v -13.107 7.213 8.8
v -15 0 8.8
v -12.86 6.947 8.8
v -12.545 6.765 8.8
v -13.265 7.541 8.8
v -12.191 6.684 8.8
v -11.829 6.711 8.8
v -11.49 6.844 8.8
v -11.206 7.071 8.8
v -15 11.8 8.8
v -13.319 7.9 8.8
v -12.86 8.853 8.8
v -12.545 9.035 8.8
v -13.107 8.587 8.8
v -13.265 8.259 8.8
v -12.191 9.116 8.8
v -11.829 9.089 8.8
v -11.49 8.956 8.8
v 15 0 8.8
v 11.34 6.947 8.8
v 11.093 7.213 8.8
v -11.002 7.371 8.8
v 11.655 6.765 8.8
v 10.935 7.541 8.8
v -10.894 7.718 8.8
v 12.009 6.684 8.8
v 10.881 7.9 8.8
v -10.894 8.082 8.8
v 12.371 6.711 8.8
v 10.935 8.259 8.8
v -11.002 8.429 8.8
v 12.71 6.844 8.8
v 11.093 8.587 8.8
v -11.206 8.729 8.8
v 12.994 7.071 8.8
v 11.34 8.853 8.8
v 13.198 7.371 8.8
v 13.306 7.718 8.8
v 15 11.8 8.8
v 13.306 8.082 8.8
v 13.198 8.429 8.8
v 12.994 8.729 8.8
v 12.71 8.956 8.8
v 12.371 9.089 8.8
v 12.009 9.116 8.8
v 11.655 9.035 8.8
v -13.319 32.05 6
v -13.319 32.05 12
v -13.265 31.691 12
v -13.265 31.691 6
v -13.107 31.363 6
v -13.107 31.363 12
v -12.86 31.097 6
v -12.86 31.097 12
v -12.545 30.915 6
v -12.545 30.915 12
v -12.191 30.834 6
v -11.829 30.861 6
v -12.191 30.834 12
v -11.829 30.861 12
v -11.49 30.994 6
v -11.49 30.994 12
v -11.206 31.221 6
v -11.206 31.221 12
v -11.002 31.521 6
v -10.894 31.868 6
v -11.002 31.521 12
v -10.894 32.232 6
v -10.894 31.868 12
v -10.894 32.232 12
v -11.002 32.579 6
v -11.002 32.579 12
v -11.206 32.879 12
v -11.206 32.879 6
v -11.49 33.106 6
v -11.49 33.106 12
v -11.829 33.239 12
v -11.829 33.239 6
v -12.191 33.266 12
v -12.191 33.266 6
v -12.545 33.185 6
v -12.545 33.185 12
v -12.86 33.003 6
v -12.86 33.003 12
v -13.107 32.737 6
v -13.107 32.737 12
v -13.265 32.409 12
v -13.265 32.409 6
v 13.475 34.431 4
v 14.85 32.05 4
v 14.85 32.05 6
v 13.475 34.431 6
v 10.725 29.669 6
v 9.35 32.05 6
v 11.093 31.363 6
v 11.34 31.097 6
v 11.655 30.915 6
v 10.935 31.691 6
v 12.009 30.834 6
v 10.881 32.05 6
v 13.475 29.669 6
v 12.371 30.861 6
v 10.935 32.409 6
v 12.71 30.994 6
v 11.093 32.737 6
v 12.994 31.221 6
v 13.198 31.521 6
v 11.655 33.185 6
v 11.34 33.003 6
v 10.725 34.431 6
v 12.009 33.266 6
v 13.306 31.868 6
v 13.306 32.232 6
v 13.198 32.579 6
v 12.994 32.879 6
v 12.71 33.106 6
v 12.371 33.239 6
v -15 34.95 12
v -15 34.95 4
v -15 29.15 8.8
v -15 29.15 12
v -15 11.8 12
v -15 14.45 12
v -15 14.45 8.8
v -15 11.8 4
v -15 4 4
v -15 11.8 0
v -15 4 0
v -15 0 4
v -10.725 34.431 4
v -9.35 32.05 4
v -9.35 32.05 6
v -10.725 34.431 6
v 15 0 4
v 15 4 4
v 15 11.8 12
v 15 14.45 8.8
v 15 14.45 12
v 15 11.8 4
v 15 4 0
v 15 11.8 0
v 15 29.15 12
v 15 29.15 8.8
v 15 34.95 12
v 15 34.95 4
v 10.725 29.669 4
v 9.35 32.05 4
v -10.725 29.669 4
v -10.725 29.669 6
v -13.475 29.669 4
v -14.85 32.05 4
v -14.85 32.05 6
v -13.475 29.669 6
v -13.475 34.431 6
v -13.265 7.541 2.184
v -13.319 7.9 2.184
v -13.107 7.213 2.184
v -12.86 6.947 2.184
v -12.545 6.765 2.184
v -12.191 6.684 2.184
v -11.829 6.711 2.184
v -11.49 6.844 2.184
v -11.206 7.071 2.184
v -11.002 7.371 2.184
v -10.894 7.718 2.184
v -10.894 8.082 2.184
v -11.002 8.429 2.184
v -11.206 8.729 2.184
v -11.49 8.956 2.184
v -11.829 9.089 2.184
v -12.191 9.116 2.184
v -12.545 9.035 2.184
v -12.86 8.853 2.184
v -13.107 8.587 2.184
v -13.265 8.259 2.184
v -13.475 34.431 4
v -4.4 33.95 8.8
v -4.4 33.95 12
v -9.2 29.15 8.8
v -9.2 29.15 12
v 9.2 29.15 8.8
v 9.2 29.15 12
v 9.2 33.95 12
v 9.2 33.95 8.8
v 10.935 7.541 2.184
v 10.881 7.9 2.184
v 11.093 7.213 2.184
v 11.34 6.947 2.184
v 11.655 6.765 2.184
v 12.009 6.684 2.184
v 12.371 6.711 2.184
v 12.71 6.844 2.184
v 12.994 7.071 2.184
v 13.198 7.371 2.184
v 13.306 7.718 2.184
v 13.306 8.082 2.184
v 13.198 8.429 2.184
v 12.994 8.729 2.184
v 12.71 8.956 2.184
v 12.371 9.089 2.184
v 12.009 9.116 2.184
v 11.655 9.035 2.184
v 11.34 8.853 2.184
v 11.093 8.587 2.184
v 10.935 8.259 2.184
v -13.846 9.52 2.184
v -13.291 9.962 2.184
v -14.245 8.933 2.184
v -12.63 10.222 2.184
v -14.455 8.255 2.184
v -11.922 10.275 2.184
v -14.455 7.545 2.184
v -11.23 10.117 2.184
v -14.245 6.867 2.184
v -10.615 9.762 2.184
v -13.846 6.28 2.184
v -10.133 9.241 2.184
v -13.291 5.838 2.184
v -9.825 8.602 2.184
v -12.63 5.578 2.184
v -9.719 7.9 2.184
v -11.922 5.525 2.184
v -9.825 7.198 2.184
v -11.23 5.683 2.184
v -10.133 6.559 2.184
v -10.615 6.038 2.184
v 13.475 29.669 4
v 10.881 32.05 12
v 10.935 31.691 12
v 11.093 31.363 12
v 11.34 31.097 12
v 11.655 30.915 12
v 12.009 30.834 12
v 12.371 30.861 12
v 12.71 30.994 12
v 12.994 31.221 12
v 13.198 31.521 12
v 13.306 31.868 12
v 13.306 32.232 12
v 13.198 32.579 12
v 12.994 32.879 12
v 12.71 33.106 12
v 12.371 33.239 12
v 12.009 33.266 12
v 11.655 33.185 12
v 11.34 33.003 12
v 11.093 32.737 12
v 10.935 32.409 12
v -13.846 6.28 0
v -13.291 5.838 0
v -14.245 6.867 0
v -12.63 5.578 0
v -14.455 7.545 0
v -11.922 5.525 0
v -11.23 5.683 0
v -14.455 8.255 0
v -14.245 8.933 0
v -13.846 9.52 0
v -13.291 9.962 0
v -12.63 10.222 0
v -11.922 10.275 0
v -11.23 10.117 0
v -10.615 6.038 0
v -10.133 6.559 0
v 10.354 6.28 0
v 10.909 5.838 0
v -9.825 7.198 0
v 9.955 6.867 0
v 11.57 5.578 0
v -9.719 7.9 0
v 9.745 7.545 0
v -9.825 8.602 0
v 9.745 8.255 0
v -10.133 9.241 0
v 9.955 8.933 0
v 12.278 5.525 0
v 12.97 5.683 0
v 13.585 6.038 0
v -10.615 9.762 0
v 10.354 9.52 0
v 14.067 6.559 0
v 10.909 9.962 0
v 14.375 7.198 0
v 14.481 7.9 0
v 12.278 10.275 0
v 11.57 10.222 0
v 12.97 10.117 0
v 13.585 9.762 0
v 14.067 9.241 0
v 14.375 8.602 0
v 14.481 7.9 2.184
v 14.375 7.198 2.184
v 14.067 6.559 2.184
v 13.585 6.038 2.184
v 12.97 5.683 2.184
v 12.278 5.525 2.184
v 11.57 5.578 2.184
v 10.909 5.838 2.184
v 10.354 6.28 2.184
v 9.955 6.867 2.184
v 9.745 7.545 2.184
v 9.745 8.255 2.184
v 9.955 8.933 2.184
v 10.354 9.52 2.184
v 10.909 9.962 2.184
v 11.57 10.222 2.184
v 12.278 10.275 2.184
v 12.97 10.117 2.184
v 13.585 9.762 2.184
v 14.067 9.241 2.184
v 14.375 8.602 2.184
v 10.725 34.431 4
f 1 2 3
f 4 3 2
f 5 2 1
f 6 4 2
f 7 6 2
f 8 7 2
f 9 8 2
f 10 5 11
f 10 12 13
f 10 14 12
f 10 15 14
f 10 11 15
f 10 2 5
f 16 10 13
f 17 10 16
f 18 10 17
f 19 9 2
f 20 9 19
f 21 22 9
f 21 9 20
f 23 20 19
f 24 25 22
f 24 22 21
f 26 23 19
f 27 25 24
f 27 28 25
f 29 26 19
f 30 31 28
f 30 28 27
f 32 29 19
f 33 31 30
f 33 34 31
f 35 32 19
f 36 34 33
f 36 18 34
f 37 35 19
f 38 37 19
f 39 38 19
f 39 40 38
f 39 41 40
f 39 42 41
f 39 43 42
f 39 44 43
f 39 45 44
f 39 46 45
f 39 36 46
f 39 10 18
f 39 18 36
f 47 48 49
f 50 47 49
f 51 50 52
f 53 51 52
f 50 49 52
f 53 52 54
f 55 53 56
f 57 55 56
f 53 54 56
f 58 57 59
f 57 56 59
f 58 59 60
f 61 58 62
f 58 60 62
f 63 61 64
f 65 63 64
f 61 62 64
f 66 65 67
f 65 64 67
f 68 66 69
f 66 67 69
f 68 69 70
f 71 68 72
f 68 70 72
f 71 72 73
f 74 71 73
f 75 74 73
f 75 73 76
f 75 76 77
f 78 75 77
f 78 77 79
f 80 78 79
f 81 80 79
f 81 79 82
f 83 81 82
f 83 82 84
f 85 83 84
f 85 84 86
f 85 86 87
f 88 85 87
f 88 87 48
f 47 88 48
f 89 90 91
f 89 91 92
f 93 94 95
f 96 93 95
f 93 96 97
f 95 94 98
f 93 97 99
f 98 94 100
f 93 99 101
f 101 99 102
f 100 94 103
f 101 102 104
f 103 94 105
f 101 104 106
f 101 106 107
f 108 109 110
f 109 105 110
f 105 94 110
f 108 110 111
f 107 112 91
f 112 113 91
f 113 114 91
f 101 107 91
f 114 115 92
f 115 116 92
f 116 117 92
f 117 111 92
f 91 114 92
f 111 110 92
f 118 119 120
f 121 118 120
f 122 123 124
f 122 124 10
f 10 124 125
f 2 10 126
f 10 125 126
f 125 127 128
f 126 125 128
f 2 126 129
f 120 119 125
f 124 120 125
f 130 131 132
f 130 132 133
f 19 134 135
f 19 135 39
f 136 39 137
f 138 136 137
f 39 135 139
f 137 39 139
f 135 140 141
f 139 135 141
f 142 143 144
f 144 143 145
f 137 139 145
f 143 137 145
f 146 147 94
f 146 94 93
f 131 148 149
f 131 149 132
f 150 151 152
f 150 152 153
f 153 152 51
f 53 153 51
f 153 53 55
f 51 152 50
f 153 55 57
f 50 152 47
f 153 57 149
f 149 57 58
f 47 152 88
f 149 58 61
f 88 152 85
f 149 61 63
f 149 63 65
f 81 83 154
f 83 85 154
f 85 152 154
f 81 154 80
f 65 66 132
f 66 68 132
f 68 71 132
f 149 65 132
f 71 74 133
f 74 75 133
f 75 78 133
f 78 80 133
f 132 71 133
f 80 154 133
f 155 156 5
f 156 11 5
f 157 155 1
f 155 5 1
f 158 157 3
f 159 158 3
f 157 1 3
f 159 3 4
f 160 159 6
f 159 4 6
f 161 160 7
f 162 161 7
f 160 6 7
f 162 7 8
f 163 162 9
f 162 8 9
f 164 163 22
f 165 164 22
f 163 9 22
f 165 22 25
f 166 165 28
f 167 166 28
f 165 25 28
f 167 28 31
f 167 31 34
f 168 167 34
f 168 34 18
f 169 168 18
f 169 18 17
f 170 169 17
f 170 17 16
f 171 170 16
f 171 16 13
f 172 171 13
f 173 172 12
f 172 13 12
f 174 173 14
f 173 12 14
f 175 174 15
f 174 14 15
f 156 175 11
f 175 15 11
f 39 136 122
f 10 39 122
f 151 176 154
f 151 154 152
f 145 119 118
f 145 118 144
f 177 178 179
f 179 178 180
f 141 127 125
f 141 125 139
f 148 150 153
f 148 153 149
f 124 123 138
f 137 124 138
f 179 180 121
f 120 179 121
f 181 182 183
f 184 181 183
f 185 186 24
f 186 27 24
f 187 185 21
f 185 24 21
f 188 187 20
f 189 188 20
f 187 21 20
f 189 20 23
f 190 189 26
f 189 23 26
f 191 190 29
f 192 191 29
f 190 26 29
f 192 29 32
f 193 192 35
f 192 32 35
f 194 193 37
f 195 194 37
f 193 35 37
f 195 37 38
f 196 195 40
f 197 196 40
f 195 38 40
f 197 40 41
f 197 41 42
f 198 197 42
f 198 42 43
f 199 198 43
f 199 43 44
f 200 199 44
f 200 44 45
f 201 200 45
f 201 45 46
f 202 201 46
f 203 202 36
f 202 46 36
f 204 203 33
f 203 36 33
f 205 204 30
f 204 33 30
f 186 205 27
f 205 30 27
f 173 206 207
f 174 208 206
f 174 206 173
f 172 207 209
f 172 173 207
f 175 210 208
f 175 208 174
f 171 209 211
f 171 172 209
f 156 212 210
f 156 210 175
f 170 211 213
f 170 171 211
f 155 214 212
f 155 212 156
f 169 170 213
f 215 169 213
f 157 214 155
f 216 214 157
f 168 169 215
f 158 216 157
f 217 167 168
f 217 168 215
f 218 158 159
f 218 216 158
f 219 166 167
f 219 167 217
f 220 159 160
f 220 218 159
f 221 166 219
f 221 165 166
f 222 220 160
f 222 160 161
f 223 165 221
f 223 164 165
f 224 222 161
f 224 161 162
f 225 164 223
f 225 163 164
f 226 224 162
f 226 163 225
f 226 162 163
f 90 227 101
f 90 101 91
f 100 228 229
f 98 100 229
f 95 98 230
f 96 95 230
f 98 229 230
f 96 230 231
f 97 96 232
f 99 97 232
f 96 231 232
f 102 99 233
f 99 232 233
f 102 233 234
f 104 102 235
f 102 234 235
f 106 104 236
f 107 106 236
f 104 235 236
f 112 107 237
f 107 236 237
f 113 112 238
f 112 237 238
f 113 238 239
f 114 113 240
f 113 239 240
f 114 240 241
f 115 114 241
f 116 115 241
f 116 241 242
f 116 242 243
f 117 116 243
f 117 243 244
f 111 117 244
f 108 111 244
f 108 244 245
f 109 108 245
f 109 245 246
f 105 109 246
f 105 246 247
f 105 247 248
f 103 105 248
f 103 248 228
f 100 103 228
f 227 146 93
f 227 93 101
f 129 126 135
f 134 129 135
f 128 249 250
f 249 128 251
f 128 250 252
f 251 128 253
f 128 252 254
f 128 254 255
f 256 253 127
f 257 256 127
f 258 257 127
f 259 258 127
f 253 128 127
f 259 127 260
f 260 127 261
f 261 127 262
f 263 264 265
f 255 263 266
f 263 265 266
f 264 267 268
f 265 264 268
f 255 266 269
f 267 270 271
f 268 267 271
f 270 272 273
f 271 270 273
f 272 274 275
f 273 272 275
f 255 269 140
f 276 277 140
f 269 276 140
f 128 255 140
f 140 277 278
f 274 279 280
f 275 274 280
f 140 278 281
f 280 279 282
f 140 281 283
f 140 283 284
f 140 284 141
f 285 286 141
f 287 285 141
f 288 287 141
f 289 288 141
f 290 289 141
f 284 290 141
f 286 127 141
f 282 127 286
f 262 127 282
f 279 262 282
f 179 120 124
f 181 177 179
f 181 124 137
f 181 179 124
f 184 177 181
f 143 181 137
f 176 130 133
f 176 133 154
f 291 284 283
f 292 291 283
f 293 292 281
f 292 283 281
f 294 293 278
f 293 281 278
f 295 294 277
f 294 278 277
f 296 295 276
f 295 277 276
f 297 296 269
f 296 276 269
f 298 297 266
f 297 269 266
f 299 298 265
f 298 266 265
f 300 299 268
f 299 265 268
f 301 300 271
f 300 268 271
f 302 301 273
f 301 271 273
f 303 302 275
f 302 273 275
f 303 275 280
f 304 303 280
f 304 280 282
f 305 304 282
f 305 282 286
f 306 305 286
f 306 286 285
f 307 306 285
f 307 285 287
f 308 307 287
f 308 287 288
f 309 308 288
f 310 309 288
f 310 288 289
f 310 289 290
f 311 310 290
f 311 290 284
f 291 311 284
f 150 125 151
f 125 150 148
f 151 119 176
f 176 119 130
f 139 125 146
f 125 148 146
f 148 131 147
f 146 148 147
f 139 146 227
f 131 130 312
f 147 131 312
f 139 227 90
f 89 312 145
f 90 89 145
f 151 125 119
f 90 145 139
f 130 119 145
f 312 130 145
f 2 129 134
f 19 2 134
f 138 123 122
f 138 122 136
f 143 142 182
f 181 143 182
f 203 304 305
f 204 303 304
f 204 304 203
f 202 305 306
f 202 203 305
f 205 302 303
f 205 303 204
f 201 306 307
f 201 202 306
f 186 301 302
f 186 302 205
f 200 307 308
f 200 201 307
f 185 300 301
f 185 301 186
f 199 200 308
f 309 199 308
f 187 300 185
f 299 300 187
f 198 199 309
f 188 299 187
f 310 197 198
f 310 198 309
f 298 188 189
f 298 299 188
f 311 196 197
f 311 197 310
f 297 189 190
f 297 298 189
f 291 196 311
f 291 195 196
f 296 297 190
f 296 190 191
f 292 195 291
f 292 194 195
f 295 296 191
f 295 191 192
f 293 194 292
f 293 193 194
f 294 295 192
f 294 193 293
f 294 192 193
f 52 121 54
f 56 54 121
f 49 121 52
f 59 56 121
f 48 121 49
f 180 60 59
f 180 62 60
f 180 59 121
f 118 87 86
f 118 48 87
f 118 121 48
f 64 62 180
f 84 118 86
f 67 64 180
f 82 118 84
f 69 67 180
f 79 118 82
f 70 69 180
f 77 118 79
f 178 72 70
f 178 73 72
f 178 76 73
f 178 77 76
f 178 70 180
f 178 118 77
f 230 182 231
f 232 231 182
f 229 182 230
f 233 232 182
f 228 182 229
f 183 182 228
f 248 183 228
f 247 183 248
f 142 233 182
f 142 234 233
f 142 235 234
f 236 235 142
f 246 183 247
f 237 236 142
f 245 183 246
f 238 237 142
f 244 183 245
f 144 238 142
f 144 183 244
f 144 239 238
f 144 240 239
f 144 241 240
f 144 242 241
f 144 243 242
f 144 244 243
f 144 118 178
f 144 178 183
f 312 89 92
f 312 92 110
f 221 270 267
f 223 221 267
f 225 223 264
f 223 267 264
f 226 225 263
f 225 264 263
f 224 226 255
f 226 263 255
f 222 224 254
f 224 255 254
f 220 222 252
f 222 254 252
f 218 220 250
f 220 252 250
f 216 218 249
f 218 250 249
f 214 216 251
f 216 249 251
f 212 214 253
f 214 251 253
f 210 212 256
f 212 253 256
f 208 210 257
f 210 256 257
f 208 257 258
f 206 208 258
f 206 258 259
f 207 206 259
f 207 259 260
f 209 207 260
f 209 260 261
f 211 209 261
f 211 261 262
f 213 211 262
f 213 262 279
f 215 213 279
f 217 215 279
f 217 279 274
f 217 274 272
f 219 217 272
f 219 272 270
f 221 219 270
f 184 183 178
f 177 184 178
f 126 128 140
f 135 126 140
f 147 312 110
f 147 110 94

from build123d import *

# Parameters (mm, degrees)
F0_W           = 30
F0_H           = 23.15
F0_H_2         = 6.8
F0_R           = 1.3
F0_H_3         = 4
F0_H_4         = 1
F1_DEPTH       = 12
F2_W           = 5.8
F2_H           = 5.8
F3_DEPTH       = 3.2
F4_DEPTH       = 4
F5_D           = 2.4384
F5_DEPTH       = 10
F5_CBORE_D     = 4.7625
F5_CBORE_DEPTH = 2.1844
F5_TIP         = 0.7325692667
F6_D           = 2.4384
F6_DEPTH       = 20
F6_START       = 4
F6_TIP         = 0.7325692667
F7_DEPTH       = 6


# Not quite as in the source:
# - a feature names something its author has since deleted; it is built from what else it names


with BuildPart() as f1:
    # F0 (on Top) → F1 (new body)
    with BuildSketch(Plane.XY):
        with Locations((0, 23.375)):
            Rectangle(F0_W, F0_H)
        Polygon((-10.7251846715, 34.43125), (-9.350369343, 32.05), (-10.7251846715, 29.66875), (-13.4748153285, 29.66875), (-14.849630657, 32.05), (-13.4748153285, 34.43125), align=None, mode=Mode.SUBTRACT)
        Polygon((10.7251846715, 29.66875), (9.350369343, 32.05), (10.7251846715, 34.43125), (13.4748153285, 34.43125), (14.849630657, 32.05), (13.4748153285, 29.66875), align=None, mode=Mode.SUBTRACT)
        with Locations((0, 7.4)):
            Rectangle(F0_W, F0_H_2)
        with Locations((-12.1, 7.9)):
            Circle(F0_R, mode=Mode.SUBTRACT)
        with Locations((12.1, 7.9)):
            Circle(F0_R, mode=Mode.SUBTRACT)
        with Locations((0, 2)):
            Rectangle(F0_W, F0_H_3)
        with Locations((0, 11.3)):
            Rectangle(F0_W, F0_H_4)
        Polygon((-10.7251846715, 29.66875), (-9.350369343, 32.05), (-10.7251846715, 34.43125), (-13.4748153285, 34.43125), (-14.849630657, 32.05), (-13.4748153285, 29.66875), align=None)
        with Locations((-12.1, 32.05)):
            Circle(F0_R, mode=Mode.SUBTRACT)
        Polygon((10.7251846715, 34.43125), (9.350369343, 32.05), (10.7251846715, 29.66875), (13.4748153285, 29.66875), (14.849630657, 32.05), (13.4748153285, 34.43125), align=None)
        with Locations((12.1, 32.05)):
            Circle(F0_R, mode=Mode.SUBTRACT)
        with Locations((-12.1, 32.05)):
            Circle(F0_R)
        with Locations((12.1, 32.05)):
            Circle(F0_R)
        with Locations((12.1, 7.9)):
            Circle(F0_R)
        with Locations((-12.1, 7.9)):
            Circle(F0_R)
    extrude(amount=F1_DEPTH)

    # F2 (on face) → F3 (cut)
    with BuildSketch(Plane.XY.offset(12)):
        with Locations((-12.1, 7.9)):
            Rectangle(F2_W, F2_H)
        Polygon((9.2, 5), (9.2, 10.8), (-9.2, 10.8), (-9.2, 5), (-15, 5), (-15, 0), (15, 0), (15, 5), align=None)
        with Locations((12.1, 7.9)):
            Rectangle(F2_W, F2_H)
        Polygon((9.2, 10.8), (15, 10.8), (15, 11.8), (-15, 11.8), (-15, 10.8), (-9.2, 10.8), align=None)
        Polygon((-3.4, 14.45), (9.2, 14.45), (9.2, 20.25), (15, 20.25), (15, 29.15), (9.2, 29.15), (9.2, 33.95), (-4.4, 33.95), (-9.2, 29.15), (-13.65, 24.7), (-9.2, 20.25), align=None)
        Polygon((-15, 23.35), (-15, 20.25), (-9.2, 20.25), (-13.65, 24.7), align=None)
        Polygon((-15, 26.05), (-13.65, 24.7), (-9.2, 29.15), (-15, 29.15), align=None)
        Polygon((-15, 26.05), (-15, 23.35), (-13.65, 24.7), align=None)
        Polygon((-9.2, 14.45), (-3.4, 14.45), (-9.2, 20.25), align=None)
        with Locations((-12.1, 17.35)):
            Rectangle(F2_W, F2_H)
        with Locations((12.1, 17.35)):
            Rectangle(F2_W, F2_H)
    extrude(amount=-F3_DEPTH, mode=Mode.SUBTRACT)

    # F0 (on Top) → F4 (cut)
    with BuildSketch(Plane.XY):
        with Locations((0, 23.375)):
            Rectangle(F0_W, F0_H)
        Polygon((-10.7251846715, 34.43125), (-9.350369343, 32.05), (-10.7251846715, 29.66875), (-13.4748153285, 29.66875), (-14.849630657, 32.05), (-13.4748153285, 34.43125), align=None, mode=Mode.SUBTRACT)
        Polygon((10.7251846715, 29.66875), (9.350369343, 32.05), (10.7251846715, 34.43125), (13.4748153285, 34.43125), (14.849630657, 32.05), (13.4748153285, 29.66875), align=None, mode=Mode.SUBTRACT)
        with Locations((0, 2)):
            Rectangle(F0_W, F0_H_3)
        Polygon((-10.7251846715, 29.66875), (-9.350369343, 32.05), (-10.7251846715, 34.43125), (-13.4748153285, 34.43125), (-14.849630657, 32.05), (-13.4748153285, 29.66875), align=None)
        with Locations((-12.1, 32.05)):
            Circle(F0_R, mode=Mode.SUBTRACT)
        Polygon((10.7251846715, 34.43125), (9.350369343, 32.05), (10.7251846715, 29.66875), (13.4748153285, 29.66875), (14.849630657, 32.05), (13.4748153285, 34.43125), align=None)
        with Locations((12.1, 32.05)):
            Circle(F0_R, mode=Mode.SUBTRACT)
        with Locations((-12.1, 32.05)):
            Circle(F0_R)
        with Locations((12.1, 32.05)):
            Circle(F0_R)
    extrude(amount=F4_DEPTH, mode=Mode.SUBTRACT)

    # F5
    with Locations(Plane(origin=(0, 0, 0), x_dir=(1, 0, 0), z_dir=(0, 0, -1))):
        with Locations((-12.1, -7.9), (12.1, -7.9)):
            CounterBoreHole(F5_D / 2, F5_CBORE_D / 2, F5_CBORE_DEPTH, depth=F5_DEPTH)
            with Locations((0, 0, -(F5_DEPTH + F5_TIP / 2))):  # 118° drill point
                Cone(0, F5_D / 2, F5_TIP, mode=Mode.SUBTRACT)

    # F6
    # its depths count from where the whole tool has entered the part; down to there all is cleared
    with Locations(Plane(origin=(0, 0, 0), x_dir=(1, 0, 0), z_dir=(0, 0, -1)).offset(-F6_START)):
        with Locations((-12.1, -32.05), (12.1, -32.05)):
            Hole(F6_D / 2, depth=F6_DEPTH)
            with Locations((0, 0, -(F6_DEPTH + F6_TIP / 2))):  # 118° drill point
                Cone(0, F6_D / 2, F6_TIP, mode=Mode.SUBTRACT)

    # F0 (on Top) → F7 (cut)
    with BuildSketch(Plane.XY):
        Polygon((-10.7251846715, 29.66875), (-9.350369343, 32.05), (-10.7251846715, 34.43125), (-13.4748153285, 34.43125), (-14.849630657, 32.05), (-13.4748153285, 29.66875), align=None)
        with Locations((-12.1, 32.05)):
            Circle(F0_R, mode=Mode.SUBTRACT)
        Polygon((10.7251846715, 34.43125), (9.350369343, 32.05), (10.7251846715, 29.66875), (13.4748153285, 29.66875), (14.849630657, 32.05), (13.4748153285, 34.43125), align=None)
        with Locations((12.1, 32.05)):
            Circle(F0_R, mode=Mode.SUBTRACT)
        with Locations((12.1, 32.05)):
            Circle(F0_R)
        with Locations((-12.1, 32.05)):
            Circle(F0_R)
    extrude(amount=F7_DEPTH, mode=Mode.SUBTRACT)


solid = f1.part
